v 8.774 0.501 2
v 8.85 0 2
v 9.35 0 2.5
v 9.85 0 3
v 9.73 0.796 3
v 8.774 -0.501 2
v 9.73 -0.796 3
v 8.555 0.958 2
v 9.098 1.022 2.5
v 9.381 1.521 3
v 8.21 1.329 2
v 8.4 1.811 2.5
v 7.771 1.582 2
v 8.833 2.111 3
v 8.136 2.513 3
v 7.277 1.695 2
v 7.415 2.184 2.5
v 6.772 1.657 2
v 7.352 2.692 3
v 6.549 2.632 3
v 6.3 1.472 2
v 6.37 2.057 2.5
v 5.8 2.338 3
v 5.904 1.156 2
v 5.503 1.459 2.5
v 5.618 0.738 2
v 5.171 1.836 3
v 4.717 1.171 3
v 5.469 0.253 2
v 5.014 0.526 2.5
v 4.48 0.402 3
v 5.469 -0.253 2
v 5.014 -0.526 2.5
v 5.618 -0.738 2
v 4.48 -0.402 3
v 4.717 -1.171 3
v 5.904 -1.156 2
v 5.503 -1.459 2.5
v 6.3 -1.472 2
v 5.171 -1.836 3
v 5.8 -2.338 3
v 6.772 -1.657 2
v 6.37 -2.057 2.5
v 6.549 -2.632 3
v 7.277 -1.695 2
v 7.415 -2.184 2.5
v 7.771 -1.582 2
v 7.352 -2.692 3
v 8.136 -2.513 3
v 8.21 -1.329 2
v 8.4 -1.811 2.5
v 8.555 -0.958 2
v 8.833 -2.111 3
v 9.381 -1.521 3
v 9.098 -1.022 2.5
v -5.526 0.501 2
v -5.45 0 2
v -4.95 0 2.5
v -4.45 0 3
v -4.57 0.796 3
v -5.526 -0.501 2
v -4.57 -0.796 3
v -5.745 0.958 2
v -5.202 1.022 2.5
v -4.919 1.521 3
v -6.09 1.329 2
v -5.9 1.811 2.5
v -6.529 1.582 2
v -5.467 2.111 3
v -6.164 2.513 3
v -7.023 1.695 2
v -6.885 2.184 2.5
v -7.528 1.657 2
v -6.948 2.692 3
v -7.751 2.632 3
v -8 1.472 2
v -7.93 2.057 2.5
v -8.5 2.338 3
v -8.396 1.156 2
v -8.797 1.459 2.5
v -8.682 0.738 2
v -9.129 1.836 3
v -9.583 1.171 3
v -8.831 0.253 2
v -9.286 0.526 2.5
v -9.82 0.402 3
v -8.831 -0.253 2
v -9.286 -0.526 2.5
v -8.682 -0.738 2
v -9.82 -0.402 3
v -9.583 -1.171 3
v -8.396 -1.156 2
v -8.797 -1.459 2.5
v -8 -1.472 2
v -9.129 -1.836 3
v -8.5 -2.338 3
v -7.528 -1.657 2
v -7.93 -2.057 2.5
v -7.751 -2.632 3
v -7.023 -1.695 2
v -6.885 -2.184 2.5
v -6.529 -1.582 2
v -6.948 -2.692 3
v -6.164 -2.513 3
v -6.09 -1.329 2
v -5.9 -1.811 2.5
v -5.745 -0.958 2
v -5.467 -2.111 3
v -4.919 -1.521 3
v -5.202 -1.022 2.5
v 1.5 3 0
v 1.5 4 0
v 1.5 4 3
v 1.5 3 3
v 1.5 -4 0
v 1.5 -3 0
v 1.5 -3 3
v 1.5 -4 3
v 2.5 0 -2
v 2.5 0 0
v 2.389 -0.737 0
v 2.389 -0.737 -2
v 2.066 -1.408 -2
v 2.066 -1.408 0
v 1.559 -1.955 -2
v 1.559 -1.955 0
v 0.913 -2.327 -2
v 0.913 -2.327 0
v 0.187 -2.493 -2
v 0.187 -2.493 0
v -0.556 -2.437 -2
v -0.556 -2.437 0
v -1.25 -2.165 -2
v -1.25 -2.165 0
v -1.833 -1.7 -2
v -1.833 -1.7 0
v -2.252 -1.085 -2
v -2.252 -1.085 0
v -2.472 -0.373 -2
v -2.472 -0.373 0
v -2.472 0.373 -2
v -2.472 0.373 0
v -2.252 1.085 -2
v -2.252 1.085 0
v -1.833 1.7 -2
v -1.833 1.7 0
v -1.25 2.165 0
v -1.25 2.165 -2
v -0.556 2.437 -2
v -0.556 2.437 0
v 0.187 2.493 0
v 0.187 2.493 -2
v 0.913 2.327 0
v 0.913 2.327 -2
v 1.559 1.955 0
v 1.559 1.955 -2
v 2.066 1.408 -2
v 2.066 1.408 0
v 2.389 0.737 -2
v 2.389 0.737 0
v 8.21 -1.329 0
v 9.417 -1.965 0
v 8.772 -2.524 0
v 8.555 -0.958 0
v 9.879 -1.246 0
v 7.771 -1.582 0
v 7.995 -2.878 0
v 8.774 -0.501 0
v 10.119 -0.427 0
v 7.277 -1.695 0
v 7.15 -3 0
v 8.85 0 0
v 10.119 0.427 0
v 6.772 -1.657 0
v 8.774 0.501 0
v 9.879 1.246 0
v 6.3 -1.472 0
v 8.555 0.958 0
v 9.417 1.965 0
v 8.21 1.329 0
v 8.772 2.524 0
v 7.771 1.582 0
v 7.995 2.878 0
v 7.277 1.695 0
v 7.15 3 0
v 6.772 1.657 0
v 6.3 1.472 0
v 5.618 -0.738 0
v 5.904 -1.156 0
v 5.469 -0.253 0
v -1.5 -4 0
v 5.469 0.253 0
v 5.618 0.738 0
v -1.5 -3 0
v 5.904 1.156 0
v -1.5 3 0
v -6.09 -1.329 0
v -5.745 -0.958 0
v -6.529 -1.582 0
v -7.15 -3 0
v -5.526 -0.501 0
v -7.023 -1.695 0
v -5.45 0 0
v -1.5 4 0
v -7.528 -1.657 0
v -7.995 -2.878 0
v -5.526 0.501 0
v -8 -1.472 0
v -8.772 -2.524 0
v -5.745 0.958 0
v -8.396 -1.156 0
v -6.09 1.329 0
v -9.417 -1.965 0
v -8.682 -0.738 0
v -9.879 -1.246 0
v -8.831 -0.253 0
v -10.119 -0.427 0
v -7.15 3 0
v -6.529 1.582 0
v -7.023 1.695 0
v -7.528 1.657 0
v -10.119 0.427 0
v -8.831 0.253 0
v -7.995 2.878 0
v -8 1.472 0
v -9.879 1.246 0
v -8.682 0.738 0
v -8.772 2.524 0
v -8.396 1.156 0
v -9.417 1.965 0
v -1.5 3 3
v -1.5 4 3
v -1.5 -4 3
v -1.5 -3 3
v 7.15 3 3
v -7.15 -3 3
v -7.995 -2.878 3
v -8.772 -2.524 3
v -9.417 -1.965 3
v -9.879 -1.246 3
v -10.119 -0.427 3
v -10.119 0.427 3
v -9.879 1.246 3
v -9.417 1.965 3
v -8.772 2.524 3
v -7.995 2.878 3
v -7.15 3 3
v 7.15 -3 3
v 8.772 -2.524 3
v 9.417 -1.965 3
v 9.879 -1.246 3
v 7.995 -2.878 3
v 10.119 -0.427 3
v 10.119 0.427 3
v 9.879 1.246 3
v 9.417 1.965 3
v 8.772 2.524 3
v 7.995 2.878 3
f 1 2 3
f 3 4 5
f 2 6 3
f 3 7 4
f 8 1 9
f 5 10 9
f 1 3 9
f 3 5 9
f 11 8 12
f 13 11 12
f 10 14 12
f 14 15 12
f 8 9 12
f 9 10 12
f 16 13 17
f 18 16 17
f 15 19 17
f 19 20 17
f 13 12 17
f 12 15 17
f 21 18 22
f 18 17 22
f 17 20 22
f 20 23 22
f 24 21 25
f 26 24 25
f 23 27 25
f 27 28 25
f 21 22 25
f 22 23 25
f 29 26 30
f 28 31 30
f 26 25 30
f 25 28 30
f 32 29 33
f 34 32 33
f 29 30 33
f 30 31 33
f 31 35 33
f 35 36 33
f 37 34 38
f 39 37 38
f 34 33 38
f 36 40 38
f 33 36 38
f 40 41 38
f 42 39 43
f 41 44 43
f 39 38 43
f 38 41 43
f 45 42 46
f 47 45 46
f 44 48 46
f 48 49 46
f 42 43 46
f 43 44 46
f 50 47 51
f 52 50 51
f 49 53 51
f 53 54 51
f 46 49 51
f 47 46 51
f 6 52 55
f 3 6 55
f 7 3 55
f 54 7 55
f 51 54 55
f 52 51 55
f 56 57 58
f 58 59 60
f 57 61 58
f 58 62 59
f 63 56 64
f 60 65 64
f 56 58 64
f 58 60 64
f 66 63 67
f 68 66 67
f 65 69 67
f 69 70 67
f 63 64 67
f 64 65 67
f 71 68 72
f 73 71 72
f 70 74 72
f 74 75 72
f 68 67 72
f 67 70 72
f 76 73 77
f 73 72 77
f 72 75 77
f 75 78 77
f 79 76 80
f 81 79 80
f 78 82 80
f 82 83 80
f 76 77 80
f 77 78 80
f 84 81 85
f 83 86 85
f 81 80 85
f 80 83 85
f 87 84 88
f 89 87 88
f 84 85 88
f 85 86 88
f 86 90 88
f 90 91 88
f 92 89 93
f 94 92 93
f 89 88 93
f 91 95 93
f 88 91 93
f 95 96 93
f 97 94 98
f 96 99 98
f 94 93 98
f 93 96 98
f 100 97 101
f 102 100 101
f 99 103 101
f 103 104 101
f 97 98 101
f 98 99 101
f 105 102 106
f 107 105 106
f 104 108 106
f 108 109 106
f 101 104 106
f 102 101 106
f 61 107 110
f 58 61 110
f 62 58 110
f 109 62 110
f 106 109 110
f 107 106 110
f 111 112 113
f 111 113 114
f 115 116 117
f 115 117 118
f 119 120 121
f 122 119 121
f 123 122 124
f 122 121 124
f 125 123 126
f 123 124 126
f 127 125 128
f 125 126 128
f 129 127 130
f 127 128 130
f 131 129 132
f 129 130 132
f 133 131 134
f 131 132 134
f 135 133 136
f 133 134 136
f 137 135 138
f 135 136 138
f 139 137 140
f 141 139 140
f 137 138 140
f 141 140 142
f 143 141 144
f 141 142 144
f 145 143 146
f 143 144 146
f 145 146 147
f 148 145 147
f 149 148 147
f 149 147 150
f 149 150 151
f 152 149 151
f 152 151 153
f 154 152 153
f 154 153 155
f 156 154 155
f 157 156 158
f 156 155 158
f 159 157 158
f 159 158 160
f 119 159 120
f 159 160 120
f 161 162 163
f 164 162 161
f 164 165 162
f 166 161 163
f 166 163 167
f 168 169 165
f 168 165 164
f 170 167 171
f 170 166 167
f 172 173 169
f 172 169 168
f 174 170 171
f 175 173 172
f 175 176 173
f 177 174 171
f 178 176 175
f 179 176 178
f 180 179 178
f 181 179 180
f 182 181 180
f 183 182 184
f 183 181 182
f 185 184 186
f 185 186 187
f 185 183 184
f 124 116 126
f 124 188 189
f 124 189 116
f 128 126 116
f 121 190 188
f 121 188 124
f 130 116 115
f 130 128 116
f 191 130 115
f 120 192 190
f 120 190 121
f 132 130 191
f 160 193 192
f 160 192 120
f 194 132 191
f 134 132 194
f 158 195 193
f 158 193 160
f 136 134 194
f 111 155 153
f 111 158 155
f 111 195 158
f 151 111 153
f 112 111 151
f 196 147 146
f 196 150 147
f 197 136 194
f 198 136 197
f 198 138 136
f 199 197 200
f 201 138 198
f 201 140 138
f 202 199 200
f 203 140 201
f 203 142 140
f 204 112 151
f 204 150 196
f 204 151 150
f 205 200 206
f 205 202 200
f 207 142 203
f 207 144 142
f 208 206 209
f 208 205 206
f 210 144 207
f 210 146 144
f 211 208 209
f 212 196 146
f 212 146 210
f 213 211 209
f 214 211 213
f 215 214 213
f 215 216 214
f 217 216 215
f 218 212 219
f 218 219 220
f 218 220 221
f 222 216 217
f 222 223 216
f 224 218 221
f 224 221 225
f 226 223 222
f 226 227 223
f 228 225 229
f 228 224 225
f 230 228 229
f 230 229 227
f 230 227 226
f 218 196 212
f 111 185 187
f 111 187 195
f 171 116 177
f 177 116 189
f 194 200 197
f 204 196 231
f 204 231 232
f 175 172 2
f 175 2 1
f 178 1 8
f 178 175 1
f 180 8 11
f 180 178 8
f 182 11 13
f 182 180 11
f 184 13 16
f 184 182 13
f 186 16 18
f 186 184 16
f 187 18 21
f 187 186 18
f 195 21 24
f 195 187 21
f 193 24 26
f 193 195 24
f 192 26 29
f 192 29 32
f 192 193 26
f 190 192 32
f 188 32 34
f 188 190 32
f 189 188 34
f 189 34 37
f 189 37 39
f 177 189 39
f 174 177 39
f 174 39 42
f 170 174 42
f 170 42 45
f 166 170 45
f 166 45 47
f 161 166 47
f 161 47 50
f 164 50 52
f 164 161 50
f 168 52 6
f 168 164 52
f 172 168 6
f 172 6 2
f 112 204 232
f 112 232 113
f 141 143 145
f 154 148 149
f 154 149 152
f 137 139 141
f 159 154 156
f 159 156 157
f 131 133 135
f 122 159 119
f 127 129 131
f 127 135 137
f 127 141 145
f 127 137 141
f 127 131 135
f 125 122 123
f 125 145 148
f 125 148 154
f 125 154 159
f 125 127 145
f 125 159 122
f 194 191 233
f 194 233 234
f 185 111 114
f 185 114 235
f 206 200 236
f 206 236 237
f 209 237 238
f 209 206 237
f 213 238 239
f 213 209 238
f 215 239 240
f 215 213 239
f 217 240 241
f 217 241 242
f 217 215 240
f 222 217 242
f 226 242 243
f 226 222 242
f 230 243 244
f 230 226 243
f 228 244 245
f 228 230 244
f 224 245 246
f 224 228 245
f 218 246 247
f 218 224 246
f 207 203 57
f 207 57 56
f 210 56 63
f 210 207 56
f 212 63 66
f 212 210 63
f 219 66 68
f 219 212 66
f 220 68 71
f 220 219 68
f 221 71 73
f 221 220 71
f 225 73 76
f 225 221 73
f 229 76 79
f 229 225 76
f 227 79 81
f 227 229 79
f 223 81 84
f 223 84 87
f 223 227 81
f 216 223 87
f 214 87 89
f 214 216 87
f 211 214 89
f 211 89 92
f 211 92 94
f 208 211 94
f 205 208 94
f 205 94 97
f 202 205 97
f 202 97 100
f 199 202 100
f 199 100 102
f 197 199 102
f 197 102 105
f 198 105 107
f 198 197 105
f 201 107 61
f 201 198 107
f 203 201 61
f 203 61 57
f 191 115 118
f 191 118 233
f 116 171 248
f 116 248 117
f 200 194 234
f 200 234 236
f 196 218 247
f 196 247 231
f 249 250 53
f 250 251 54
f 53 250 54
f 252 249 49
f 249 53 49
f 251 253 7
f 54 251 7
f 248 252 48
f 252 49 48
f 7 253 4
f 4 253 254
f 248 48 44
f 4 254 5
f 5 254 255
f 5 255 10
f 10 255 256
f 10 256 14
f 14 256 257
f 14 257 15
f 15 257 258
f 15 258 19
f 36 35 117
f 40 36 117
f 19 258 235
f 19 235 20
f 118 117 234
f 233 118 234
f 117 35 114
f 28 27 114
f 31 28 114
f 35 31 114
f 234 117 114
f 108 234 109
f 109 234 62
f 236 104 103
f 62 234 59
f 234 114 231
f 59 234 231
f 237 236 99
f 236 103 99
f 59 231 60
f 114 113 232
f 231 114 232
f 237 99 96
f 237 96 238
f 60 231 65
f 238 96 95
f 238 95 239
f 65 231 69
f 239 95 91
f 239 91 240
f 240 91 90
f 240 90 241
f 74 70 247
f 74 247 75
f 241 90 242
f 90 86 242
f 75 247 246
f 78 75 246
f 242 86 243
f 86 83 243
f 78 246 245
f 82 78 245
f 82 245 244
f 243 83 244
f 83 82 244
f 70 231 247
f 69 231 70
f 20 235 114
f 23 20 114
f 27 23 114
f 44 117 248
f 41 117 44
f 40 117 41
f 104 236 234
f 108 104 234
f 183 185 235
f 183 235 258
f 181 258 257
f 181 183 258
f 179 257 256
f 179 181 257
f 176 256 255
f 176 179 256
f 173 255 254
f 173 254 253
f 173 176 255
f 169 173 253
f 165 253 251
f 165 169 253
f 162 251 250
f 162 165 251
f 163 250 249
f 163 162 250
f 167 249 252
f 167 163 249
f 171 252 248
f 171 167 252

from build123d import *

# Parameters (mm, degrees)
SKETCH1_R           = 1.7
BOSS_EXTRUDE1_DEPTH = 3
CHAMFER1_SIZE       = 1
SKETCH2_R           = 2.5
BOSS_EXTRUDE2_DEPTH = 2


with BuildPart() as part:
    # Sketch1 → Boss-Extrude1 (new body)
    with BuildSketch(Plane.XY):
        with BuildLine():
            Line((-7.15, 3), (-1.5, 3))
            Line((-1.5, 3), (-1.5, 4))
            Line((-1.5, 4), (1.5, 4))
            Line((1.5, 4), (1.5, 3))
            Line((1.5, 3), (7.15, 3))
            ThreePointArc((7.15, 3), (10.15, 0), (7.15, -3))
            Line((7.15, -3), (1.5, -3))
            Line((1.5, -3), (1.5, -4))
            Line((1.5, -4), (-1.5, -4))
            Line((-1.5, -4), (-1.5, -3))
            Line((-1.5, -3), (-7.15, -3))
            ThreePointArc((-7.15, -3), (-10.15, 0), (-7.15, 3))
        make_face()
        with Locations((-7.15, 0)):
            Circle(SKETCH1_R, mode=Mode.SUBTRACT)
        with Locations((7.15, 0)):
            Circle(SKETCH1_R, mode=Mode.SUBTRACT)
    extrude(amount=BOSS_EXTRUDE1_DEPTH)

    # Chamfer1
    chamfer1_edges = [part.edges().sort_by_distance(p)[0] for p in [
        (5.45, 0, 3),
        (-8.85, 0, 3),
    ]]
    chamfer(chamfer1_edges, length=CHAMFER1_SIZE)

    # Sketch2 → Boss-Extrude2 (add)
    with BuildSketch(Plane(origin=(0, 0, 0), x_dir=(-1, 0, 0), z_dir=(0, 0, -1))):
        with Locations(Location((0, 0, 0), (0, 0, 180))):
            Circle(SKETCH2_R)
    extrude(amount=BOSS_EXTRUDE2_DEPTH)


solid = part.part
